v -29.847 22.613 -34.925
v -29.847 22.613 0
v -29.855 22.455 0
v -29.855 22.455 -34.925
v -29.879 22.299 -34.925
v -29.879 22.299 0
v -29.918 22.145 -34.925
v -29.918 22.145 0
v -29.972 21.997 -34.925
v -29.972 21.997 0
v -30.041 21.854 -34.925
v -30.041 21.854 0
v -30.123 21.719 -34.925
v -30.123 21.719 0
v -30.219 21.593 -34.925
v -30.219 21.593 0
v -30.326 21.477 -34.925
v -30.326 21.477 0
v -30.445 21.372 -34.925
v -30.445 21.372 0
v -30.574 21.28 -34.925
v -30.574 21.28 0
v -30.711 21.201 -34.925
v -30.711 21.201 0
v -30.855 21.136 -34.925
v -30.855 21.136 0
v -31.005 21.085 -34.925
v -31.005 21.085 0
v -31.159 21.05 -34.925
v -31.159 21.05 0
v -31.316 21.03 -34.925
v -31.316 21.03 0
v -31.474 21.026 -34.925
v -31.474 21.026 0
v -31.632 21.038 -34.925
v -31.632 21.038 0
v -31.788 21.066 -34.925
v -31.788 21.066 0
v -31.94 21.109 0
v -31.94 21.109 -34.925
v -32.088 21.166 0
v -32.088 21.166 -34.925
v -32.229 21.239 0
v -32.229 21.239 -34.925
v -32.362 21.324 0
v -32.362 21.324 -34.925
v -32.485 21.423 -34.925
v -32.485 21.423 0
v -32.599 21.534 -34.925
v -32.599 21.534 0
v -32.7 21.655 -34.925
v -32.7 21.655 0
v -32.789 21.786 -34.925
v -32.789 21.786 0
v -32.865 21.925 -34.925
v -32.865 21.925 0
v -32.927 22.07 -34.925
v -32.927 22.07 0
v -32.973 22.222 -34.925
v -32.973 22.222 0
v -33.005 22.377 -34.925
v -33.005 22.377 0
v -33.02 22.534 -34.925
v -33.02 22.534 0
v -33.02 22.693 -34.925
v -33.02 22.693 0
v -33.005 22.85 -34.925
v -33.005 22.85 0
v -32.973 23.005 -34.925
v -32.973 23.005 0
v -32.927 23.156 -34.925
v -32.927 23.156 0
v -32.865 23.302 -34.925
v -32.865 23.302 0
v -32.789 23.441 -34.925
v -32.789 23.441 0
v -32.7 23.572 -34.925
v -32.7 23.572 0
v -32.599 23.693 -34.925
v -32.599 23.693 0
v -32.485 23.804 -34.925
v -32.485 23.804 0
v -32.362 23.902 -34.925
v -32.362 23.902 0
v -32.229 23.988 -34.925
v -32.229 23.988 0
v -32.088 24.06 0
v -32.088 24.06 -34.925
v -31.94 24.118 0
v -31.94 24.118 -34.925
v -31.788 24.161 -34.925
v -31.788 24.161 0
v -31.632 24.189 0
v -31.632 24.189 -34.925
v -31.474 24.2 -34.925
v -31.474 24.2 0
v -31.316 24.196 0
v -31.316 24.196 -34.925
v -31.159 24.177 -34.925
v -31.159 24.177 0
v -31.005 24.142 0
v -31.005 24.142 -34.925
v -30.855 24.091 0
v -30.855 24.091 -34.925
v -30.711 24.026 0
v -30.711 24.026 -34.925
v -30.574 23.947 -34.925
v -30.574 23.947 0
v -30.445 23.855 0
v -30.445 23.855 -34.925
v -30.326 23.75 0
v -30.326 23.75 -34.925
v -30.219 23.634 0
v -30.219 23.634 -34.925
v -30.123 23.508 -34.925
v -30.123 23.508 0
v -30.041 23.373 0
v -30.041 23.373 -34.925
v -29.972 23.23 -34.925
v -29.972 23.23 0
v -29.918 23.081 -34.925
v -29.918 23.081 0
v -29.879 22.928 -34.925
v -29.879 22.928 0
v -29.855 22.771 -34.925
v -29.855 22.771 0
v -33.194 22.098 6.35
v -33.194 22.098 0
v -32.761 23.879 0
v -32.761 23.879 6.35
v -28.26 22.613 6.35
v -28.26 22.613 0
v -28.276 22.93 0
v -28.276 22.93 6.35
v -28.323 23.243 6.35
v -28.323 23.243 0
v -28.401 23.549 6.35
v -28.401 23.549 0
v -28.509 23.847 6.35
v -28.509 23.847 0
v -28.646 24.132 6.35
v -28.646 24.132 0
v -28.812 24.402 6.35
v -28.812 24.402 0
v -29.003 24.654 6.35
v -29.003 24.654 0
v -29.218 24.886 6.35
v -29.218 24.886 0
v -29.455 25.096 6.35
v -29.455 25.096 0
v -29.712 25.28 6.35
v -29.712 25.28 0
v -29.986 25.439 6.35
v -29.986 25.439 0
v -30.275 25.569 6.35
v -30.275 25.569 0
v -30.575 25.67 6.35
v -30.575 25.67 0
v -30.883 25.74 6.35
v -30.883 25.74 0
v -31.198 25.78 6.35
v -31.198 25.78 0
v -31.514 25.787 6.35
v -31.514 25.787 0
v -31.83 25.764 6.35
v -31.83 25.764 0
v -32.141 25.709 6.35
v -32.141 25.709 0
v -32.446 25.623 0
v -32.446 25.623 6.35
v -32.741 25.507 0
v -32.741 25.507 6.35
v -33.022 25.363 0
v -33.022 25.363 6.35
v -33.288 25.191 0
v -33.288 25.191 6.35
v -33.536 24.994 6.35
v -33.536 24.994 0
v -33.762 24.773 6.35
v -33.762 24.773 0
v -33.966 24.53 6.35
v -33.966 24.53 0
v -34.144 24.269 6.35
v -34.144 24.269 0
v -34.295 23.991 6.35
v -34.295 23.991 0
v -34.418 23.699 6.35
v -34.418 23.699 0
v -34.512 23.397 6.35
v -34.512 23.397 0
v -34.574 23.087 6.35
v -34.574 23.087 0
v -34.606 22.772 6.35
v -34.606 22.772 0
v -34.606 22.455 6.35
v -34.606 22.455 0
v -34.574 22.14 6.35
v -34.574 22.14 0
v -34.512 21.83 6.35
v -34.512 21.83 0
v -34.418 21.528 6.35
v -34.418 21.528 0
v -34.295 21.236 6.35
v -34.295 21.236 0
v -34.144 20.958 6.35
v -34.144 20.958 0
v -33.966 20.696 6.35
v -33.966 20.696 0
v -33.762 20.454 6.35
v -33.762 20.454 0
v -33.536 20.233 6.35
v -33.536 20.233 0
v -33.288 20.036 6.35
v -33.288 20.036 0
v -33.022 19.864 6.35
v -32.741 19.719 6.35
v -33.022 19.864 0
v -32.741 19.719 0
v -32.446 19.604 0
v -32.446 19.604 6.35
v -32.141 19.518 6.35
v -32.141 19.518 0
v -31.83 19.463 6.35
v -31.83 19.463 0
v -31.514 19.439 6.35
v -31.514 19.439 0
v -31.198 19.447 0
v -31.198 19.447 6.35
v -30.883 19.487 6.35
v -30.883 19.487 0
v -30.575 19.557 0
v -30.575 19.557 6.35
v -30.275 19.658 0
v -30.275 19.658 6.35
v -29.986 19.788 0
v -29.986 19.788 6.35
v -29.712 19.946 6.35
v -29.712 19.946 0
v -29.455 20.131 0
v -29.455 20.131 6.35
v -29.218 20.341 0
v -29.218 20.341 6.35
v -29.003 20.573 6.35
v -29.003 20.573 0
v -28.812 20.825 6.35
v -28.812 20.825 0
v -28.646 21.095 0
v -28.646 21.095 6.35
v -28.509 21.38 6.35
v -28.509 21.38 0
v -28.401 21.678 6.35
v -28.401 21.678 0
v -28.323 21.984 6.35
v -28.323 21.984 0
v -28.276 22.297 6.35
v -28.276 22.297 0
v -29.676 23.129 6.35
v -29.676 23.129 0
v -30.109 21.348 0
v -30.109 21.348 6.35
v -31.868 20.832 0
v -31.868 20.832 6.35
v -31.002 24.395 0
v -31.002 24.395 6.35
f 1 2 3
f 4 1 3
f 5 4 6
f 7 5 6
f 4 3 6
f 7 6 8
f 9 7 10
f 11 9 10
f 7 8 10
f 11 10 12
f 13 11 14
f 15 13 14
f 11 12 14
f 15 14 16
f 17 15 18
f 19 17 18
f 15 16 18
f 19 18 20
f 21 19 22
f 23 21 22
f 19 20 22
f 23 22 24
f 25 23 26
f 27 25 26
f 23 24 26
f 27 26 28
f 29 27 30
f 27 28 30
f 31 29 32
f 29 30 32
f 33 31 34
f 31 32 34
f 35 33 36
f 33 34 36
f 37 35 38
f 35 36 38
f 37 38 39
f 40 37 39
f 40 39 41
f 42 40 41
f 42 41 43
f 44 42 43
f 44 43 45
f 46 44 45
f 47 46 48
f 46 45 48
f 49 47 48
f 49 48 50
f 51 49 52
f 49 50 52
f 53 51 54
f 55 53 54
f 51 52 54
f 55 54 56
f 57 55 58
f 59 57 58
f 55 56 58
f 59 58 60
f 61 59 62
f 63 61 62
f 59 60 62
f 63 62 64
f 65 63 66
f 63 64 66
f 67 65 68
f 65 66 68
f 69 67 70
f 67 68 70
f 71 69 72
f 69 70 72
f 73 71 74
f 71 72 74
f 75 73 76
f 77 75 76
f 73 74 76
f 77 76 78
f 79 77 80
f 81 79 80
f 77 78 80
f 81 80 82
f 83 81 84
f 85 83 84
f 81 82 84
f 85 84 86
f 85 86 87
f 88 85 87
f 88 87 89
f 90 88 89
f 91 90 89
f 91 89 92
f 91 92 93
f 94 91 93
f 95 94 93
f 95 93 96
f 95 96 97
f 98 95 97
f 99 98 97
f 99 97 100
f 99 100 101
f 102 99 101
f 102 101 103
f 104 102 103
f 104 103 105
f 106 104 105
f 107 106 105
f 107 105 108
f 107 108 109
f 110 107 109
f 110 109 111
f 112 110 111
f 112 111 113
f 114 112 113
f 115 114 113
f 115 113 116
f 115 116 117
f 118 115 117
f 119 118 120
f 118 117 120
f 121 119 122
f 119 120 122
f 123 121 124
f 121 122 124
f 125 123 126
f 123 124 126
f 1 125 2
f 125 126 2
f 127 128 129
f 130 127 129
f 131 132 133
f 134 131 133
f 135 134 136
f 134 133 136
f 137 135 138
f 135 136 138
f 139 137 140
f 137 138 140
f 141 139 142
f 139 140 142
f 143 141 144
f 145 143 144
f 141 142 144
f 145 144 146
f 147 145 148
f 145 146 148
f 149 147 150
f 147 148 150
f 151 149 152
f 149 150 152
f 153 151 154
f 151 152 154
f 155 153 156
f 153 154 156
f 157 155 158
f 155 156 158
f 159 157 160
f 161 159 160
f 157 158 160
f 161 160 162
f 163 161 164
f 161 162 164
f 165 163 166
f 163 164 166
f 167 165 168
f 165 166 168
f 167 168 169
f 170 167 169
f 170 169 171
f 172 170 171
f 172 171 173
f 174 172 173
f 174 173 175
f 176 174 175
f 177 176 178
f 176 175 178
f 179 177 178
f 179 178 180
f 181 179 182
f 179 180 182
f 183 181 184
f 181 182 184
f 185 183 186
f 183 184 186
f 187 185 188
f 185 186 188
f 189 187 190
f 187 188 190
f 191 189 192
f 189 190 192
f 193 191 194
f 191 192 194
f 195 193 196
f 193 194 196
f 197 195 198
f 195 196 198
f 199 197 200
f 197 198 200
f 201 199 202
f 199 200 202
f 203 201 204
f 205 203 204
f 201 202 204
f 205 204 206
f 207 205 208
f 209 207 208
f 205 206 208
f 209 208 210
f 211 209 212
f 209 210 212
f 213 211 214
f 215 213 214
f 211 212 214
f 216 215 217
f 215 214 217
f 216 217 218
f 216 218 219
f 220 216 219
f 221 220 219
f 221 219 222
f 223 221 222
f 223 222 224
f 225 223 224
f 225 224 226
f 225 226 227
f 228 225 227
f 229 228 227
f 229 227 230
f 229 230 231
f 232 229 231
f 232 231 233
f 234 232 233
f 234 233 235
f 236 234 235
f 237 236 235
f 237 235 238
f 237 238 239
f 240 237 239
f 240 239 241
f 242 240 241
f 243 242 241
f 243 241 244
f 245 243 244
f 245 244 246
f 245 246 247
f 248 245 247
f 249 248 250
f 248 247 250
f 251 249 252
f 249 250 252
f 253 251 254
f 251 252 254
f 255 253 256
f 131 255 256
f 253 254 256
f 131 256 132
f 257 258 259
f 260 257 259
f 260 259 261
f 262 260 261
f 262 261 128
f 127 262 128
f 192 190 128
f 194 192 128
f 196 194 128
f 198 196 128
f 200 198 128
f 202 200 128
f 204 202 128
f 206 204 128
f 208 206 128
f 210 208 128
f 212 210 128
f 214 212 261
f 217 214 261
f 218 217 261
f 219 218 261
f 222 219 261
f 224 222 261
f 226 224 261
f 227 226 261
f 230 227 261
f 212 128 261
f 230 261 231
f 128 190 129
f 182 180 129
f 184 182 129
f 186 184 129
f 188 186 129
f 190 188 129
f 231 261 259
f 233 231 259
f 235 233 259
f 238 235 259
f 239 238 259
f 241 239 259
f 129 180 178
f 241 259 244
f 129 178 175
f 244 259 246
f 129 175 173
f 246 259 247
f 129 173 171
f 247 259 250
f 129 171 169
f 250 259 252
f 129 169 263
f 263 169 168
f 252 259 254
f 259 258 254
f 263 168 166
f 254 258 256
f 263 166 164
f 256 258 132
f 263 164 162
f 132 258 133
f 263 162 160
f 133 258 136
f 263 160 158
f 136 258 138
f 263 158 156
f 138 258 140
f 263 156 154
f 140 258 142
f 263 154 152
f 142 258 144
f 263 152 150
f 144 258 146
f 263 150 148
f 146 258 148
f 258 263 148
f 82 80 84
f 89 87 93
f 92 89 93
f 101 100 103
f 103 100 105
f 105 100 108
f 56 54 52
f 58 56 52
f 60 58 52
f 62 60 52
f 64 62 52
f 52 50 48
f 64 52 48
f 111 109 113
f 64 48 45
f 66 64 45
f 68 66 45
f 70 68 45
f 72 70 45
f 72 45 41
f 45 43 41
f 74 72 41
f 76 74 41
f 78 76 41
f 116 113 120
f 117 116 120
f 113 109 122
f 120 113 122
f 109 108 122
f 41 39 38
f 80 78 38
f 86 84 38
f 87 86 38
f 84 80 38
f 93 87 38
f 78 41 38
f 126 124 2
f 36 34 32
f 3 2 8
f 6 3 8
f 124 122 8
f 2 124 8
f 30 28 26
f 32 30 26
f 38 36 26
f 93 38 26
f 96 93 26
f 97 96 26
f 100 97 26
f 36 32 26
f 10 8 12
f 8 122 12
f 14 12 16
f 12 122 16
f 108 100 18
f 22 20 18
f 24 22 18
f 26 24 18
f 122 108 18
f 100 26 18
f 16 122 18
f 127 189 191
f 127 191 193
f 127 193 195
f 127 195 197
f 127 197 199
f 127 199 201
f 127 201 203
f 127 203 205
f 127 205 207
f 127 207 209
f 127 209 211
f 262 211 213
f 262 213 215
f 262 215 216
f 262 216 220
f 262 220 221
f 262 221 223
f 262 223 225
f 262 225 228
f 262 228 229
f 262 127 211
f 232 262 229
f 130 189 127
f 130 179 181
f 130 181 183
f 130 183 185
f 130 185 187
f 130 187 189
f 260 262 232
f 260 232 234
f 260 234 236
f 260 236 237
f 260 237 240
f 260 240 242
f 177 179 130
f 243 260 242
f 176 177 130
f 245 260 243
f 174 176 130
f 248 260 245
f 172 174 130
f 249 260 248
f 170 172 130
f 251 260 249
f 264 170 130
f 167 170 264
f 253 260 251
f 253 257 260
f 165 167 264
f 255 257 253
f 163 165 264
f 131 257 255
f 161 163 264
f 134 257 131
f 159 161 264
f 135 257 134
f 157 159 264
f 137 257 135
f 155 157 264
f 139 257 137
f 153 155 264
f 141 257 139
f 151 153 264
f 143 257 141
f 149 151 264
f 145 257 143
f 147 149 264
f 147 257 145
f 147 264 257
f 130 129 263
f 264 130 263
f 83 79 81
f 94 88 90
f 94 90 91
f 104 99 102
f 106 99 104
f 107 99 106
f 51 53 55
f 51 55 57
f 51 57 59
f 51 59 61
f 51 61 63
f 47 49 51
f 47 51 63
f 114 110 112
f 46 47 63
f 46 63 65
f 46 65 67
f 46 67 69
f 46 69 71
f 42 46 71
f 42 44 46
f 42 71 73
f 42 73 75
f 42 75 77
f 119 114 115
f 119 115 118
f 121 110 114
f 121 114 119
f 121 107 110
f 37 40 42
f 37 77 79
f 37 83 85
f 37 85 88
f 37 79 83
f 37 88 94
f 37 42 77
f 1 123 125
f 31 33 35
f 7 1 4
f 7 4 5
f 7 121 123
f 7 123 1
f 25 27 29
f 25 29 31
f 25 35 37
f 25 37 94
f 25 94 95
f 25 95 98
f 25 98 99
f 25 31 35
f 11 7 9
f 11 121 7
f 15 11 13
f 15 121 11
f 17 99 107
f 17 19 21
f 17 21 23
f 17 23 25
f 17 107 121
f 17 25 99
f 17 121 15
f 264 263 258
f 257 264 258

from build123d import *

# Parameters (mm, degrees)
F0_R     = 3.175
F1_DEPTH = 6.35
F2_R     = 1.5875
F3_DEPTH = 34.925


with BuildPart() as f1:
    # F0 (on Top) → F1 (new body)
    with BuildSketch(Plane.XY):
        with Locations((-31.434811, 22.613416)):
            Circle(F0_R)
        Polygon((-33.193928, 22.097939), (-32.760786, 23.879117), (-31.001669, 24.394595), (-29.675695, 23.128894), (-30.108836, 21.347715), (-31.867953, 20.832238), align=None, mode=Mode.SUBTRACT)
    extrude(amount=F1_DEPTH)


with BuildPart() as f3:
    # F2 (on face) → F3 (new body)
    with BuildSketch(Plane(origin=(0, 0, 0), x_dir=(1, 0, 0), z_dir=(0, 0, -1))):
        with Locations((-31.434811, -22.613416)):
            Circle(F2_R)
    extrude(amount=F3_DEPTH)


solid = Compound([f1.part, f3.part])
